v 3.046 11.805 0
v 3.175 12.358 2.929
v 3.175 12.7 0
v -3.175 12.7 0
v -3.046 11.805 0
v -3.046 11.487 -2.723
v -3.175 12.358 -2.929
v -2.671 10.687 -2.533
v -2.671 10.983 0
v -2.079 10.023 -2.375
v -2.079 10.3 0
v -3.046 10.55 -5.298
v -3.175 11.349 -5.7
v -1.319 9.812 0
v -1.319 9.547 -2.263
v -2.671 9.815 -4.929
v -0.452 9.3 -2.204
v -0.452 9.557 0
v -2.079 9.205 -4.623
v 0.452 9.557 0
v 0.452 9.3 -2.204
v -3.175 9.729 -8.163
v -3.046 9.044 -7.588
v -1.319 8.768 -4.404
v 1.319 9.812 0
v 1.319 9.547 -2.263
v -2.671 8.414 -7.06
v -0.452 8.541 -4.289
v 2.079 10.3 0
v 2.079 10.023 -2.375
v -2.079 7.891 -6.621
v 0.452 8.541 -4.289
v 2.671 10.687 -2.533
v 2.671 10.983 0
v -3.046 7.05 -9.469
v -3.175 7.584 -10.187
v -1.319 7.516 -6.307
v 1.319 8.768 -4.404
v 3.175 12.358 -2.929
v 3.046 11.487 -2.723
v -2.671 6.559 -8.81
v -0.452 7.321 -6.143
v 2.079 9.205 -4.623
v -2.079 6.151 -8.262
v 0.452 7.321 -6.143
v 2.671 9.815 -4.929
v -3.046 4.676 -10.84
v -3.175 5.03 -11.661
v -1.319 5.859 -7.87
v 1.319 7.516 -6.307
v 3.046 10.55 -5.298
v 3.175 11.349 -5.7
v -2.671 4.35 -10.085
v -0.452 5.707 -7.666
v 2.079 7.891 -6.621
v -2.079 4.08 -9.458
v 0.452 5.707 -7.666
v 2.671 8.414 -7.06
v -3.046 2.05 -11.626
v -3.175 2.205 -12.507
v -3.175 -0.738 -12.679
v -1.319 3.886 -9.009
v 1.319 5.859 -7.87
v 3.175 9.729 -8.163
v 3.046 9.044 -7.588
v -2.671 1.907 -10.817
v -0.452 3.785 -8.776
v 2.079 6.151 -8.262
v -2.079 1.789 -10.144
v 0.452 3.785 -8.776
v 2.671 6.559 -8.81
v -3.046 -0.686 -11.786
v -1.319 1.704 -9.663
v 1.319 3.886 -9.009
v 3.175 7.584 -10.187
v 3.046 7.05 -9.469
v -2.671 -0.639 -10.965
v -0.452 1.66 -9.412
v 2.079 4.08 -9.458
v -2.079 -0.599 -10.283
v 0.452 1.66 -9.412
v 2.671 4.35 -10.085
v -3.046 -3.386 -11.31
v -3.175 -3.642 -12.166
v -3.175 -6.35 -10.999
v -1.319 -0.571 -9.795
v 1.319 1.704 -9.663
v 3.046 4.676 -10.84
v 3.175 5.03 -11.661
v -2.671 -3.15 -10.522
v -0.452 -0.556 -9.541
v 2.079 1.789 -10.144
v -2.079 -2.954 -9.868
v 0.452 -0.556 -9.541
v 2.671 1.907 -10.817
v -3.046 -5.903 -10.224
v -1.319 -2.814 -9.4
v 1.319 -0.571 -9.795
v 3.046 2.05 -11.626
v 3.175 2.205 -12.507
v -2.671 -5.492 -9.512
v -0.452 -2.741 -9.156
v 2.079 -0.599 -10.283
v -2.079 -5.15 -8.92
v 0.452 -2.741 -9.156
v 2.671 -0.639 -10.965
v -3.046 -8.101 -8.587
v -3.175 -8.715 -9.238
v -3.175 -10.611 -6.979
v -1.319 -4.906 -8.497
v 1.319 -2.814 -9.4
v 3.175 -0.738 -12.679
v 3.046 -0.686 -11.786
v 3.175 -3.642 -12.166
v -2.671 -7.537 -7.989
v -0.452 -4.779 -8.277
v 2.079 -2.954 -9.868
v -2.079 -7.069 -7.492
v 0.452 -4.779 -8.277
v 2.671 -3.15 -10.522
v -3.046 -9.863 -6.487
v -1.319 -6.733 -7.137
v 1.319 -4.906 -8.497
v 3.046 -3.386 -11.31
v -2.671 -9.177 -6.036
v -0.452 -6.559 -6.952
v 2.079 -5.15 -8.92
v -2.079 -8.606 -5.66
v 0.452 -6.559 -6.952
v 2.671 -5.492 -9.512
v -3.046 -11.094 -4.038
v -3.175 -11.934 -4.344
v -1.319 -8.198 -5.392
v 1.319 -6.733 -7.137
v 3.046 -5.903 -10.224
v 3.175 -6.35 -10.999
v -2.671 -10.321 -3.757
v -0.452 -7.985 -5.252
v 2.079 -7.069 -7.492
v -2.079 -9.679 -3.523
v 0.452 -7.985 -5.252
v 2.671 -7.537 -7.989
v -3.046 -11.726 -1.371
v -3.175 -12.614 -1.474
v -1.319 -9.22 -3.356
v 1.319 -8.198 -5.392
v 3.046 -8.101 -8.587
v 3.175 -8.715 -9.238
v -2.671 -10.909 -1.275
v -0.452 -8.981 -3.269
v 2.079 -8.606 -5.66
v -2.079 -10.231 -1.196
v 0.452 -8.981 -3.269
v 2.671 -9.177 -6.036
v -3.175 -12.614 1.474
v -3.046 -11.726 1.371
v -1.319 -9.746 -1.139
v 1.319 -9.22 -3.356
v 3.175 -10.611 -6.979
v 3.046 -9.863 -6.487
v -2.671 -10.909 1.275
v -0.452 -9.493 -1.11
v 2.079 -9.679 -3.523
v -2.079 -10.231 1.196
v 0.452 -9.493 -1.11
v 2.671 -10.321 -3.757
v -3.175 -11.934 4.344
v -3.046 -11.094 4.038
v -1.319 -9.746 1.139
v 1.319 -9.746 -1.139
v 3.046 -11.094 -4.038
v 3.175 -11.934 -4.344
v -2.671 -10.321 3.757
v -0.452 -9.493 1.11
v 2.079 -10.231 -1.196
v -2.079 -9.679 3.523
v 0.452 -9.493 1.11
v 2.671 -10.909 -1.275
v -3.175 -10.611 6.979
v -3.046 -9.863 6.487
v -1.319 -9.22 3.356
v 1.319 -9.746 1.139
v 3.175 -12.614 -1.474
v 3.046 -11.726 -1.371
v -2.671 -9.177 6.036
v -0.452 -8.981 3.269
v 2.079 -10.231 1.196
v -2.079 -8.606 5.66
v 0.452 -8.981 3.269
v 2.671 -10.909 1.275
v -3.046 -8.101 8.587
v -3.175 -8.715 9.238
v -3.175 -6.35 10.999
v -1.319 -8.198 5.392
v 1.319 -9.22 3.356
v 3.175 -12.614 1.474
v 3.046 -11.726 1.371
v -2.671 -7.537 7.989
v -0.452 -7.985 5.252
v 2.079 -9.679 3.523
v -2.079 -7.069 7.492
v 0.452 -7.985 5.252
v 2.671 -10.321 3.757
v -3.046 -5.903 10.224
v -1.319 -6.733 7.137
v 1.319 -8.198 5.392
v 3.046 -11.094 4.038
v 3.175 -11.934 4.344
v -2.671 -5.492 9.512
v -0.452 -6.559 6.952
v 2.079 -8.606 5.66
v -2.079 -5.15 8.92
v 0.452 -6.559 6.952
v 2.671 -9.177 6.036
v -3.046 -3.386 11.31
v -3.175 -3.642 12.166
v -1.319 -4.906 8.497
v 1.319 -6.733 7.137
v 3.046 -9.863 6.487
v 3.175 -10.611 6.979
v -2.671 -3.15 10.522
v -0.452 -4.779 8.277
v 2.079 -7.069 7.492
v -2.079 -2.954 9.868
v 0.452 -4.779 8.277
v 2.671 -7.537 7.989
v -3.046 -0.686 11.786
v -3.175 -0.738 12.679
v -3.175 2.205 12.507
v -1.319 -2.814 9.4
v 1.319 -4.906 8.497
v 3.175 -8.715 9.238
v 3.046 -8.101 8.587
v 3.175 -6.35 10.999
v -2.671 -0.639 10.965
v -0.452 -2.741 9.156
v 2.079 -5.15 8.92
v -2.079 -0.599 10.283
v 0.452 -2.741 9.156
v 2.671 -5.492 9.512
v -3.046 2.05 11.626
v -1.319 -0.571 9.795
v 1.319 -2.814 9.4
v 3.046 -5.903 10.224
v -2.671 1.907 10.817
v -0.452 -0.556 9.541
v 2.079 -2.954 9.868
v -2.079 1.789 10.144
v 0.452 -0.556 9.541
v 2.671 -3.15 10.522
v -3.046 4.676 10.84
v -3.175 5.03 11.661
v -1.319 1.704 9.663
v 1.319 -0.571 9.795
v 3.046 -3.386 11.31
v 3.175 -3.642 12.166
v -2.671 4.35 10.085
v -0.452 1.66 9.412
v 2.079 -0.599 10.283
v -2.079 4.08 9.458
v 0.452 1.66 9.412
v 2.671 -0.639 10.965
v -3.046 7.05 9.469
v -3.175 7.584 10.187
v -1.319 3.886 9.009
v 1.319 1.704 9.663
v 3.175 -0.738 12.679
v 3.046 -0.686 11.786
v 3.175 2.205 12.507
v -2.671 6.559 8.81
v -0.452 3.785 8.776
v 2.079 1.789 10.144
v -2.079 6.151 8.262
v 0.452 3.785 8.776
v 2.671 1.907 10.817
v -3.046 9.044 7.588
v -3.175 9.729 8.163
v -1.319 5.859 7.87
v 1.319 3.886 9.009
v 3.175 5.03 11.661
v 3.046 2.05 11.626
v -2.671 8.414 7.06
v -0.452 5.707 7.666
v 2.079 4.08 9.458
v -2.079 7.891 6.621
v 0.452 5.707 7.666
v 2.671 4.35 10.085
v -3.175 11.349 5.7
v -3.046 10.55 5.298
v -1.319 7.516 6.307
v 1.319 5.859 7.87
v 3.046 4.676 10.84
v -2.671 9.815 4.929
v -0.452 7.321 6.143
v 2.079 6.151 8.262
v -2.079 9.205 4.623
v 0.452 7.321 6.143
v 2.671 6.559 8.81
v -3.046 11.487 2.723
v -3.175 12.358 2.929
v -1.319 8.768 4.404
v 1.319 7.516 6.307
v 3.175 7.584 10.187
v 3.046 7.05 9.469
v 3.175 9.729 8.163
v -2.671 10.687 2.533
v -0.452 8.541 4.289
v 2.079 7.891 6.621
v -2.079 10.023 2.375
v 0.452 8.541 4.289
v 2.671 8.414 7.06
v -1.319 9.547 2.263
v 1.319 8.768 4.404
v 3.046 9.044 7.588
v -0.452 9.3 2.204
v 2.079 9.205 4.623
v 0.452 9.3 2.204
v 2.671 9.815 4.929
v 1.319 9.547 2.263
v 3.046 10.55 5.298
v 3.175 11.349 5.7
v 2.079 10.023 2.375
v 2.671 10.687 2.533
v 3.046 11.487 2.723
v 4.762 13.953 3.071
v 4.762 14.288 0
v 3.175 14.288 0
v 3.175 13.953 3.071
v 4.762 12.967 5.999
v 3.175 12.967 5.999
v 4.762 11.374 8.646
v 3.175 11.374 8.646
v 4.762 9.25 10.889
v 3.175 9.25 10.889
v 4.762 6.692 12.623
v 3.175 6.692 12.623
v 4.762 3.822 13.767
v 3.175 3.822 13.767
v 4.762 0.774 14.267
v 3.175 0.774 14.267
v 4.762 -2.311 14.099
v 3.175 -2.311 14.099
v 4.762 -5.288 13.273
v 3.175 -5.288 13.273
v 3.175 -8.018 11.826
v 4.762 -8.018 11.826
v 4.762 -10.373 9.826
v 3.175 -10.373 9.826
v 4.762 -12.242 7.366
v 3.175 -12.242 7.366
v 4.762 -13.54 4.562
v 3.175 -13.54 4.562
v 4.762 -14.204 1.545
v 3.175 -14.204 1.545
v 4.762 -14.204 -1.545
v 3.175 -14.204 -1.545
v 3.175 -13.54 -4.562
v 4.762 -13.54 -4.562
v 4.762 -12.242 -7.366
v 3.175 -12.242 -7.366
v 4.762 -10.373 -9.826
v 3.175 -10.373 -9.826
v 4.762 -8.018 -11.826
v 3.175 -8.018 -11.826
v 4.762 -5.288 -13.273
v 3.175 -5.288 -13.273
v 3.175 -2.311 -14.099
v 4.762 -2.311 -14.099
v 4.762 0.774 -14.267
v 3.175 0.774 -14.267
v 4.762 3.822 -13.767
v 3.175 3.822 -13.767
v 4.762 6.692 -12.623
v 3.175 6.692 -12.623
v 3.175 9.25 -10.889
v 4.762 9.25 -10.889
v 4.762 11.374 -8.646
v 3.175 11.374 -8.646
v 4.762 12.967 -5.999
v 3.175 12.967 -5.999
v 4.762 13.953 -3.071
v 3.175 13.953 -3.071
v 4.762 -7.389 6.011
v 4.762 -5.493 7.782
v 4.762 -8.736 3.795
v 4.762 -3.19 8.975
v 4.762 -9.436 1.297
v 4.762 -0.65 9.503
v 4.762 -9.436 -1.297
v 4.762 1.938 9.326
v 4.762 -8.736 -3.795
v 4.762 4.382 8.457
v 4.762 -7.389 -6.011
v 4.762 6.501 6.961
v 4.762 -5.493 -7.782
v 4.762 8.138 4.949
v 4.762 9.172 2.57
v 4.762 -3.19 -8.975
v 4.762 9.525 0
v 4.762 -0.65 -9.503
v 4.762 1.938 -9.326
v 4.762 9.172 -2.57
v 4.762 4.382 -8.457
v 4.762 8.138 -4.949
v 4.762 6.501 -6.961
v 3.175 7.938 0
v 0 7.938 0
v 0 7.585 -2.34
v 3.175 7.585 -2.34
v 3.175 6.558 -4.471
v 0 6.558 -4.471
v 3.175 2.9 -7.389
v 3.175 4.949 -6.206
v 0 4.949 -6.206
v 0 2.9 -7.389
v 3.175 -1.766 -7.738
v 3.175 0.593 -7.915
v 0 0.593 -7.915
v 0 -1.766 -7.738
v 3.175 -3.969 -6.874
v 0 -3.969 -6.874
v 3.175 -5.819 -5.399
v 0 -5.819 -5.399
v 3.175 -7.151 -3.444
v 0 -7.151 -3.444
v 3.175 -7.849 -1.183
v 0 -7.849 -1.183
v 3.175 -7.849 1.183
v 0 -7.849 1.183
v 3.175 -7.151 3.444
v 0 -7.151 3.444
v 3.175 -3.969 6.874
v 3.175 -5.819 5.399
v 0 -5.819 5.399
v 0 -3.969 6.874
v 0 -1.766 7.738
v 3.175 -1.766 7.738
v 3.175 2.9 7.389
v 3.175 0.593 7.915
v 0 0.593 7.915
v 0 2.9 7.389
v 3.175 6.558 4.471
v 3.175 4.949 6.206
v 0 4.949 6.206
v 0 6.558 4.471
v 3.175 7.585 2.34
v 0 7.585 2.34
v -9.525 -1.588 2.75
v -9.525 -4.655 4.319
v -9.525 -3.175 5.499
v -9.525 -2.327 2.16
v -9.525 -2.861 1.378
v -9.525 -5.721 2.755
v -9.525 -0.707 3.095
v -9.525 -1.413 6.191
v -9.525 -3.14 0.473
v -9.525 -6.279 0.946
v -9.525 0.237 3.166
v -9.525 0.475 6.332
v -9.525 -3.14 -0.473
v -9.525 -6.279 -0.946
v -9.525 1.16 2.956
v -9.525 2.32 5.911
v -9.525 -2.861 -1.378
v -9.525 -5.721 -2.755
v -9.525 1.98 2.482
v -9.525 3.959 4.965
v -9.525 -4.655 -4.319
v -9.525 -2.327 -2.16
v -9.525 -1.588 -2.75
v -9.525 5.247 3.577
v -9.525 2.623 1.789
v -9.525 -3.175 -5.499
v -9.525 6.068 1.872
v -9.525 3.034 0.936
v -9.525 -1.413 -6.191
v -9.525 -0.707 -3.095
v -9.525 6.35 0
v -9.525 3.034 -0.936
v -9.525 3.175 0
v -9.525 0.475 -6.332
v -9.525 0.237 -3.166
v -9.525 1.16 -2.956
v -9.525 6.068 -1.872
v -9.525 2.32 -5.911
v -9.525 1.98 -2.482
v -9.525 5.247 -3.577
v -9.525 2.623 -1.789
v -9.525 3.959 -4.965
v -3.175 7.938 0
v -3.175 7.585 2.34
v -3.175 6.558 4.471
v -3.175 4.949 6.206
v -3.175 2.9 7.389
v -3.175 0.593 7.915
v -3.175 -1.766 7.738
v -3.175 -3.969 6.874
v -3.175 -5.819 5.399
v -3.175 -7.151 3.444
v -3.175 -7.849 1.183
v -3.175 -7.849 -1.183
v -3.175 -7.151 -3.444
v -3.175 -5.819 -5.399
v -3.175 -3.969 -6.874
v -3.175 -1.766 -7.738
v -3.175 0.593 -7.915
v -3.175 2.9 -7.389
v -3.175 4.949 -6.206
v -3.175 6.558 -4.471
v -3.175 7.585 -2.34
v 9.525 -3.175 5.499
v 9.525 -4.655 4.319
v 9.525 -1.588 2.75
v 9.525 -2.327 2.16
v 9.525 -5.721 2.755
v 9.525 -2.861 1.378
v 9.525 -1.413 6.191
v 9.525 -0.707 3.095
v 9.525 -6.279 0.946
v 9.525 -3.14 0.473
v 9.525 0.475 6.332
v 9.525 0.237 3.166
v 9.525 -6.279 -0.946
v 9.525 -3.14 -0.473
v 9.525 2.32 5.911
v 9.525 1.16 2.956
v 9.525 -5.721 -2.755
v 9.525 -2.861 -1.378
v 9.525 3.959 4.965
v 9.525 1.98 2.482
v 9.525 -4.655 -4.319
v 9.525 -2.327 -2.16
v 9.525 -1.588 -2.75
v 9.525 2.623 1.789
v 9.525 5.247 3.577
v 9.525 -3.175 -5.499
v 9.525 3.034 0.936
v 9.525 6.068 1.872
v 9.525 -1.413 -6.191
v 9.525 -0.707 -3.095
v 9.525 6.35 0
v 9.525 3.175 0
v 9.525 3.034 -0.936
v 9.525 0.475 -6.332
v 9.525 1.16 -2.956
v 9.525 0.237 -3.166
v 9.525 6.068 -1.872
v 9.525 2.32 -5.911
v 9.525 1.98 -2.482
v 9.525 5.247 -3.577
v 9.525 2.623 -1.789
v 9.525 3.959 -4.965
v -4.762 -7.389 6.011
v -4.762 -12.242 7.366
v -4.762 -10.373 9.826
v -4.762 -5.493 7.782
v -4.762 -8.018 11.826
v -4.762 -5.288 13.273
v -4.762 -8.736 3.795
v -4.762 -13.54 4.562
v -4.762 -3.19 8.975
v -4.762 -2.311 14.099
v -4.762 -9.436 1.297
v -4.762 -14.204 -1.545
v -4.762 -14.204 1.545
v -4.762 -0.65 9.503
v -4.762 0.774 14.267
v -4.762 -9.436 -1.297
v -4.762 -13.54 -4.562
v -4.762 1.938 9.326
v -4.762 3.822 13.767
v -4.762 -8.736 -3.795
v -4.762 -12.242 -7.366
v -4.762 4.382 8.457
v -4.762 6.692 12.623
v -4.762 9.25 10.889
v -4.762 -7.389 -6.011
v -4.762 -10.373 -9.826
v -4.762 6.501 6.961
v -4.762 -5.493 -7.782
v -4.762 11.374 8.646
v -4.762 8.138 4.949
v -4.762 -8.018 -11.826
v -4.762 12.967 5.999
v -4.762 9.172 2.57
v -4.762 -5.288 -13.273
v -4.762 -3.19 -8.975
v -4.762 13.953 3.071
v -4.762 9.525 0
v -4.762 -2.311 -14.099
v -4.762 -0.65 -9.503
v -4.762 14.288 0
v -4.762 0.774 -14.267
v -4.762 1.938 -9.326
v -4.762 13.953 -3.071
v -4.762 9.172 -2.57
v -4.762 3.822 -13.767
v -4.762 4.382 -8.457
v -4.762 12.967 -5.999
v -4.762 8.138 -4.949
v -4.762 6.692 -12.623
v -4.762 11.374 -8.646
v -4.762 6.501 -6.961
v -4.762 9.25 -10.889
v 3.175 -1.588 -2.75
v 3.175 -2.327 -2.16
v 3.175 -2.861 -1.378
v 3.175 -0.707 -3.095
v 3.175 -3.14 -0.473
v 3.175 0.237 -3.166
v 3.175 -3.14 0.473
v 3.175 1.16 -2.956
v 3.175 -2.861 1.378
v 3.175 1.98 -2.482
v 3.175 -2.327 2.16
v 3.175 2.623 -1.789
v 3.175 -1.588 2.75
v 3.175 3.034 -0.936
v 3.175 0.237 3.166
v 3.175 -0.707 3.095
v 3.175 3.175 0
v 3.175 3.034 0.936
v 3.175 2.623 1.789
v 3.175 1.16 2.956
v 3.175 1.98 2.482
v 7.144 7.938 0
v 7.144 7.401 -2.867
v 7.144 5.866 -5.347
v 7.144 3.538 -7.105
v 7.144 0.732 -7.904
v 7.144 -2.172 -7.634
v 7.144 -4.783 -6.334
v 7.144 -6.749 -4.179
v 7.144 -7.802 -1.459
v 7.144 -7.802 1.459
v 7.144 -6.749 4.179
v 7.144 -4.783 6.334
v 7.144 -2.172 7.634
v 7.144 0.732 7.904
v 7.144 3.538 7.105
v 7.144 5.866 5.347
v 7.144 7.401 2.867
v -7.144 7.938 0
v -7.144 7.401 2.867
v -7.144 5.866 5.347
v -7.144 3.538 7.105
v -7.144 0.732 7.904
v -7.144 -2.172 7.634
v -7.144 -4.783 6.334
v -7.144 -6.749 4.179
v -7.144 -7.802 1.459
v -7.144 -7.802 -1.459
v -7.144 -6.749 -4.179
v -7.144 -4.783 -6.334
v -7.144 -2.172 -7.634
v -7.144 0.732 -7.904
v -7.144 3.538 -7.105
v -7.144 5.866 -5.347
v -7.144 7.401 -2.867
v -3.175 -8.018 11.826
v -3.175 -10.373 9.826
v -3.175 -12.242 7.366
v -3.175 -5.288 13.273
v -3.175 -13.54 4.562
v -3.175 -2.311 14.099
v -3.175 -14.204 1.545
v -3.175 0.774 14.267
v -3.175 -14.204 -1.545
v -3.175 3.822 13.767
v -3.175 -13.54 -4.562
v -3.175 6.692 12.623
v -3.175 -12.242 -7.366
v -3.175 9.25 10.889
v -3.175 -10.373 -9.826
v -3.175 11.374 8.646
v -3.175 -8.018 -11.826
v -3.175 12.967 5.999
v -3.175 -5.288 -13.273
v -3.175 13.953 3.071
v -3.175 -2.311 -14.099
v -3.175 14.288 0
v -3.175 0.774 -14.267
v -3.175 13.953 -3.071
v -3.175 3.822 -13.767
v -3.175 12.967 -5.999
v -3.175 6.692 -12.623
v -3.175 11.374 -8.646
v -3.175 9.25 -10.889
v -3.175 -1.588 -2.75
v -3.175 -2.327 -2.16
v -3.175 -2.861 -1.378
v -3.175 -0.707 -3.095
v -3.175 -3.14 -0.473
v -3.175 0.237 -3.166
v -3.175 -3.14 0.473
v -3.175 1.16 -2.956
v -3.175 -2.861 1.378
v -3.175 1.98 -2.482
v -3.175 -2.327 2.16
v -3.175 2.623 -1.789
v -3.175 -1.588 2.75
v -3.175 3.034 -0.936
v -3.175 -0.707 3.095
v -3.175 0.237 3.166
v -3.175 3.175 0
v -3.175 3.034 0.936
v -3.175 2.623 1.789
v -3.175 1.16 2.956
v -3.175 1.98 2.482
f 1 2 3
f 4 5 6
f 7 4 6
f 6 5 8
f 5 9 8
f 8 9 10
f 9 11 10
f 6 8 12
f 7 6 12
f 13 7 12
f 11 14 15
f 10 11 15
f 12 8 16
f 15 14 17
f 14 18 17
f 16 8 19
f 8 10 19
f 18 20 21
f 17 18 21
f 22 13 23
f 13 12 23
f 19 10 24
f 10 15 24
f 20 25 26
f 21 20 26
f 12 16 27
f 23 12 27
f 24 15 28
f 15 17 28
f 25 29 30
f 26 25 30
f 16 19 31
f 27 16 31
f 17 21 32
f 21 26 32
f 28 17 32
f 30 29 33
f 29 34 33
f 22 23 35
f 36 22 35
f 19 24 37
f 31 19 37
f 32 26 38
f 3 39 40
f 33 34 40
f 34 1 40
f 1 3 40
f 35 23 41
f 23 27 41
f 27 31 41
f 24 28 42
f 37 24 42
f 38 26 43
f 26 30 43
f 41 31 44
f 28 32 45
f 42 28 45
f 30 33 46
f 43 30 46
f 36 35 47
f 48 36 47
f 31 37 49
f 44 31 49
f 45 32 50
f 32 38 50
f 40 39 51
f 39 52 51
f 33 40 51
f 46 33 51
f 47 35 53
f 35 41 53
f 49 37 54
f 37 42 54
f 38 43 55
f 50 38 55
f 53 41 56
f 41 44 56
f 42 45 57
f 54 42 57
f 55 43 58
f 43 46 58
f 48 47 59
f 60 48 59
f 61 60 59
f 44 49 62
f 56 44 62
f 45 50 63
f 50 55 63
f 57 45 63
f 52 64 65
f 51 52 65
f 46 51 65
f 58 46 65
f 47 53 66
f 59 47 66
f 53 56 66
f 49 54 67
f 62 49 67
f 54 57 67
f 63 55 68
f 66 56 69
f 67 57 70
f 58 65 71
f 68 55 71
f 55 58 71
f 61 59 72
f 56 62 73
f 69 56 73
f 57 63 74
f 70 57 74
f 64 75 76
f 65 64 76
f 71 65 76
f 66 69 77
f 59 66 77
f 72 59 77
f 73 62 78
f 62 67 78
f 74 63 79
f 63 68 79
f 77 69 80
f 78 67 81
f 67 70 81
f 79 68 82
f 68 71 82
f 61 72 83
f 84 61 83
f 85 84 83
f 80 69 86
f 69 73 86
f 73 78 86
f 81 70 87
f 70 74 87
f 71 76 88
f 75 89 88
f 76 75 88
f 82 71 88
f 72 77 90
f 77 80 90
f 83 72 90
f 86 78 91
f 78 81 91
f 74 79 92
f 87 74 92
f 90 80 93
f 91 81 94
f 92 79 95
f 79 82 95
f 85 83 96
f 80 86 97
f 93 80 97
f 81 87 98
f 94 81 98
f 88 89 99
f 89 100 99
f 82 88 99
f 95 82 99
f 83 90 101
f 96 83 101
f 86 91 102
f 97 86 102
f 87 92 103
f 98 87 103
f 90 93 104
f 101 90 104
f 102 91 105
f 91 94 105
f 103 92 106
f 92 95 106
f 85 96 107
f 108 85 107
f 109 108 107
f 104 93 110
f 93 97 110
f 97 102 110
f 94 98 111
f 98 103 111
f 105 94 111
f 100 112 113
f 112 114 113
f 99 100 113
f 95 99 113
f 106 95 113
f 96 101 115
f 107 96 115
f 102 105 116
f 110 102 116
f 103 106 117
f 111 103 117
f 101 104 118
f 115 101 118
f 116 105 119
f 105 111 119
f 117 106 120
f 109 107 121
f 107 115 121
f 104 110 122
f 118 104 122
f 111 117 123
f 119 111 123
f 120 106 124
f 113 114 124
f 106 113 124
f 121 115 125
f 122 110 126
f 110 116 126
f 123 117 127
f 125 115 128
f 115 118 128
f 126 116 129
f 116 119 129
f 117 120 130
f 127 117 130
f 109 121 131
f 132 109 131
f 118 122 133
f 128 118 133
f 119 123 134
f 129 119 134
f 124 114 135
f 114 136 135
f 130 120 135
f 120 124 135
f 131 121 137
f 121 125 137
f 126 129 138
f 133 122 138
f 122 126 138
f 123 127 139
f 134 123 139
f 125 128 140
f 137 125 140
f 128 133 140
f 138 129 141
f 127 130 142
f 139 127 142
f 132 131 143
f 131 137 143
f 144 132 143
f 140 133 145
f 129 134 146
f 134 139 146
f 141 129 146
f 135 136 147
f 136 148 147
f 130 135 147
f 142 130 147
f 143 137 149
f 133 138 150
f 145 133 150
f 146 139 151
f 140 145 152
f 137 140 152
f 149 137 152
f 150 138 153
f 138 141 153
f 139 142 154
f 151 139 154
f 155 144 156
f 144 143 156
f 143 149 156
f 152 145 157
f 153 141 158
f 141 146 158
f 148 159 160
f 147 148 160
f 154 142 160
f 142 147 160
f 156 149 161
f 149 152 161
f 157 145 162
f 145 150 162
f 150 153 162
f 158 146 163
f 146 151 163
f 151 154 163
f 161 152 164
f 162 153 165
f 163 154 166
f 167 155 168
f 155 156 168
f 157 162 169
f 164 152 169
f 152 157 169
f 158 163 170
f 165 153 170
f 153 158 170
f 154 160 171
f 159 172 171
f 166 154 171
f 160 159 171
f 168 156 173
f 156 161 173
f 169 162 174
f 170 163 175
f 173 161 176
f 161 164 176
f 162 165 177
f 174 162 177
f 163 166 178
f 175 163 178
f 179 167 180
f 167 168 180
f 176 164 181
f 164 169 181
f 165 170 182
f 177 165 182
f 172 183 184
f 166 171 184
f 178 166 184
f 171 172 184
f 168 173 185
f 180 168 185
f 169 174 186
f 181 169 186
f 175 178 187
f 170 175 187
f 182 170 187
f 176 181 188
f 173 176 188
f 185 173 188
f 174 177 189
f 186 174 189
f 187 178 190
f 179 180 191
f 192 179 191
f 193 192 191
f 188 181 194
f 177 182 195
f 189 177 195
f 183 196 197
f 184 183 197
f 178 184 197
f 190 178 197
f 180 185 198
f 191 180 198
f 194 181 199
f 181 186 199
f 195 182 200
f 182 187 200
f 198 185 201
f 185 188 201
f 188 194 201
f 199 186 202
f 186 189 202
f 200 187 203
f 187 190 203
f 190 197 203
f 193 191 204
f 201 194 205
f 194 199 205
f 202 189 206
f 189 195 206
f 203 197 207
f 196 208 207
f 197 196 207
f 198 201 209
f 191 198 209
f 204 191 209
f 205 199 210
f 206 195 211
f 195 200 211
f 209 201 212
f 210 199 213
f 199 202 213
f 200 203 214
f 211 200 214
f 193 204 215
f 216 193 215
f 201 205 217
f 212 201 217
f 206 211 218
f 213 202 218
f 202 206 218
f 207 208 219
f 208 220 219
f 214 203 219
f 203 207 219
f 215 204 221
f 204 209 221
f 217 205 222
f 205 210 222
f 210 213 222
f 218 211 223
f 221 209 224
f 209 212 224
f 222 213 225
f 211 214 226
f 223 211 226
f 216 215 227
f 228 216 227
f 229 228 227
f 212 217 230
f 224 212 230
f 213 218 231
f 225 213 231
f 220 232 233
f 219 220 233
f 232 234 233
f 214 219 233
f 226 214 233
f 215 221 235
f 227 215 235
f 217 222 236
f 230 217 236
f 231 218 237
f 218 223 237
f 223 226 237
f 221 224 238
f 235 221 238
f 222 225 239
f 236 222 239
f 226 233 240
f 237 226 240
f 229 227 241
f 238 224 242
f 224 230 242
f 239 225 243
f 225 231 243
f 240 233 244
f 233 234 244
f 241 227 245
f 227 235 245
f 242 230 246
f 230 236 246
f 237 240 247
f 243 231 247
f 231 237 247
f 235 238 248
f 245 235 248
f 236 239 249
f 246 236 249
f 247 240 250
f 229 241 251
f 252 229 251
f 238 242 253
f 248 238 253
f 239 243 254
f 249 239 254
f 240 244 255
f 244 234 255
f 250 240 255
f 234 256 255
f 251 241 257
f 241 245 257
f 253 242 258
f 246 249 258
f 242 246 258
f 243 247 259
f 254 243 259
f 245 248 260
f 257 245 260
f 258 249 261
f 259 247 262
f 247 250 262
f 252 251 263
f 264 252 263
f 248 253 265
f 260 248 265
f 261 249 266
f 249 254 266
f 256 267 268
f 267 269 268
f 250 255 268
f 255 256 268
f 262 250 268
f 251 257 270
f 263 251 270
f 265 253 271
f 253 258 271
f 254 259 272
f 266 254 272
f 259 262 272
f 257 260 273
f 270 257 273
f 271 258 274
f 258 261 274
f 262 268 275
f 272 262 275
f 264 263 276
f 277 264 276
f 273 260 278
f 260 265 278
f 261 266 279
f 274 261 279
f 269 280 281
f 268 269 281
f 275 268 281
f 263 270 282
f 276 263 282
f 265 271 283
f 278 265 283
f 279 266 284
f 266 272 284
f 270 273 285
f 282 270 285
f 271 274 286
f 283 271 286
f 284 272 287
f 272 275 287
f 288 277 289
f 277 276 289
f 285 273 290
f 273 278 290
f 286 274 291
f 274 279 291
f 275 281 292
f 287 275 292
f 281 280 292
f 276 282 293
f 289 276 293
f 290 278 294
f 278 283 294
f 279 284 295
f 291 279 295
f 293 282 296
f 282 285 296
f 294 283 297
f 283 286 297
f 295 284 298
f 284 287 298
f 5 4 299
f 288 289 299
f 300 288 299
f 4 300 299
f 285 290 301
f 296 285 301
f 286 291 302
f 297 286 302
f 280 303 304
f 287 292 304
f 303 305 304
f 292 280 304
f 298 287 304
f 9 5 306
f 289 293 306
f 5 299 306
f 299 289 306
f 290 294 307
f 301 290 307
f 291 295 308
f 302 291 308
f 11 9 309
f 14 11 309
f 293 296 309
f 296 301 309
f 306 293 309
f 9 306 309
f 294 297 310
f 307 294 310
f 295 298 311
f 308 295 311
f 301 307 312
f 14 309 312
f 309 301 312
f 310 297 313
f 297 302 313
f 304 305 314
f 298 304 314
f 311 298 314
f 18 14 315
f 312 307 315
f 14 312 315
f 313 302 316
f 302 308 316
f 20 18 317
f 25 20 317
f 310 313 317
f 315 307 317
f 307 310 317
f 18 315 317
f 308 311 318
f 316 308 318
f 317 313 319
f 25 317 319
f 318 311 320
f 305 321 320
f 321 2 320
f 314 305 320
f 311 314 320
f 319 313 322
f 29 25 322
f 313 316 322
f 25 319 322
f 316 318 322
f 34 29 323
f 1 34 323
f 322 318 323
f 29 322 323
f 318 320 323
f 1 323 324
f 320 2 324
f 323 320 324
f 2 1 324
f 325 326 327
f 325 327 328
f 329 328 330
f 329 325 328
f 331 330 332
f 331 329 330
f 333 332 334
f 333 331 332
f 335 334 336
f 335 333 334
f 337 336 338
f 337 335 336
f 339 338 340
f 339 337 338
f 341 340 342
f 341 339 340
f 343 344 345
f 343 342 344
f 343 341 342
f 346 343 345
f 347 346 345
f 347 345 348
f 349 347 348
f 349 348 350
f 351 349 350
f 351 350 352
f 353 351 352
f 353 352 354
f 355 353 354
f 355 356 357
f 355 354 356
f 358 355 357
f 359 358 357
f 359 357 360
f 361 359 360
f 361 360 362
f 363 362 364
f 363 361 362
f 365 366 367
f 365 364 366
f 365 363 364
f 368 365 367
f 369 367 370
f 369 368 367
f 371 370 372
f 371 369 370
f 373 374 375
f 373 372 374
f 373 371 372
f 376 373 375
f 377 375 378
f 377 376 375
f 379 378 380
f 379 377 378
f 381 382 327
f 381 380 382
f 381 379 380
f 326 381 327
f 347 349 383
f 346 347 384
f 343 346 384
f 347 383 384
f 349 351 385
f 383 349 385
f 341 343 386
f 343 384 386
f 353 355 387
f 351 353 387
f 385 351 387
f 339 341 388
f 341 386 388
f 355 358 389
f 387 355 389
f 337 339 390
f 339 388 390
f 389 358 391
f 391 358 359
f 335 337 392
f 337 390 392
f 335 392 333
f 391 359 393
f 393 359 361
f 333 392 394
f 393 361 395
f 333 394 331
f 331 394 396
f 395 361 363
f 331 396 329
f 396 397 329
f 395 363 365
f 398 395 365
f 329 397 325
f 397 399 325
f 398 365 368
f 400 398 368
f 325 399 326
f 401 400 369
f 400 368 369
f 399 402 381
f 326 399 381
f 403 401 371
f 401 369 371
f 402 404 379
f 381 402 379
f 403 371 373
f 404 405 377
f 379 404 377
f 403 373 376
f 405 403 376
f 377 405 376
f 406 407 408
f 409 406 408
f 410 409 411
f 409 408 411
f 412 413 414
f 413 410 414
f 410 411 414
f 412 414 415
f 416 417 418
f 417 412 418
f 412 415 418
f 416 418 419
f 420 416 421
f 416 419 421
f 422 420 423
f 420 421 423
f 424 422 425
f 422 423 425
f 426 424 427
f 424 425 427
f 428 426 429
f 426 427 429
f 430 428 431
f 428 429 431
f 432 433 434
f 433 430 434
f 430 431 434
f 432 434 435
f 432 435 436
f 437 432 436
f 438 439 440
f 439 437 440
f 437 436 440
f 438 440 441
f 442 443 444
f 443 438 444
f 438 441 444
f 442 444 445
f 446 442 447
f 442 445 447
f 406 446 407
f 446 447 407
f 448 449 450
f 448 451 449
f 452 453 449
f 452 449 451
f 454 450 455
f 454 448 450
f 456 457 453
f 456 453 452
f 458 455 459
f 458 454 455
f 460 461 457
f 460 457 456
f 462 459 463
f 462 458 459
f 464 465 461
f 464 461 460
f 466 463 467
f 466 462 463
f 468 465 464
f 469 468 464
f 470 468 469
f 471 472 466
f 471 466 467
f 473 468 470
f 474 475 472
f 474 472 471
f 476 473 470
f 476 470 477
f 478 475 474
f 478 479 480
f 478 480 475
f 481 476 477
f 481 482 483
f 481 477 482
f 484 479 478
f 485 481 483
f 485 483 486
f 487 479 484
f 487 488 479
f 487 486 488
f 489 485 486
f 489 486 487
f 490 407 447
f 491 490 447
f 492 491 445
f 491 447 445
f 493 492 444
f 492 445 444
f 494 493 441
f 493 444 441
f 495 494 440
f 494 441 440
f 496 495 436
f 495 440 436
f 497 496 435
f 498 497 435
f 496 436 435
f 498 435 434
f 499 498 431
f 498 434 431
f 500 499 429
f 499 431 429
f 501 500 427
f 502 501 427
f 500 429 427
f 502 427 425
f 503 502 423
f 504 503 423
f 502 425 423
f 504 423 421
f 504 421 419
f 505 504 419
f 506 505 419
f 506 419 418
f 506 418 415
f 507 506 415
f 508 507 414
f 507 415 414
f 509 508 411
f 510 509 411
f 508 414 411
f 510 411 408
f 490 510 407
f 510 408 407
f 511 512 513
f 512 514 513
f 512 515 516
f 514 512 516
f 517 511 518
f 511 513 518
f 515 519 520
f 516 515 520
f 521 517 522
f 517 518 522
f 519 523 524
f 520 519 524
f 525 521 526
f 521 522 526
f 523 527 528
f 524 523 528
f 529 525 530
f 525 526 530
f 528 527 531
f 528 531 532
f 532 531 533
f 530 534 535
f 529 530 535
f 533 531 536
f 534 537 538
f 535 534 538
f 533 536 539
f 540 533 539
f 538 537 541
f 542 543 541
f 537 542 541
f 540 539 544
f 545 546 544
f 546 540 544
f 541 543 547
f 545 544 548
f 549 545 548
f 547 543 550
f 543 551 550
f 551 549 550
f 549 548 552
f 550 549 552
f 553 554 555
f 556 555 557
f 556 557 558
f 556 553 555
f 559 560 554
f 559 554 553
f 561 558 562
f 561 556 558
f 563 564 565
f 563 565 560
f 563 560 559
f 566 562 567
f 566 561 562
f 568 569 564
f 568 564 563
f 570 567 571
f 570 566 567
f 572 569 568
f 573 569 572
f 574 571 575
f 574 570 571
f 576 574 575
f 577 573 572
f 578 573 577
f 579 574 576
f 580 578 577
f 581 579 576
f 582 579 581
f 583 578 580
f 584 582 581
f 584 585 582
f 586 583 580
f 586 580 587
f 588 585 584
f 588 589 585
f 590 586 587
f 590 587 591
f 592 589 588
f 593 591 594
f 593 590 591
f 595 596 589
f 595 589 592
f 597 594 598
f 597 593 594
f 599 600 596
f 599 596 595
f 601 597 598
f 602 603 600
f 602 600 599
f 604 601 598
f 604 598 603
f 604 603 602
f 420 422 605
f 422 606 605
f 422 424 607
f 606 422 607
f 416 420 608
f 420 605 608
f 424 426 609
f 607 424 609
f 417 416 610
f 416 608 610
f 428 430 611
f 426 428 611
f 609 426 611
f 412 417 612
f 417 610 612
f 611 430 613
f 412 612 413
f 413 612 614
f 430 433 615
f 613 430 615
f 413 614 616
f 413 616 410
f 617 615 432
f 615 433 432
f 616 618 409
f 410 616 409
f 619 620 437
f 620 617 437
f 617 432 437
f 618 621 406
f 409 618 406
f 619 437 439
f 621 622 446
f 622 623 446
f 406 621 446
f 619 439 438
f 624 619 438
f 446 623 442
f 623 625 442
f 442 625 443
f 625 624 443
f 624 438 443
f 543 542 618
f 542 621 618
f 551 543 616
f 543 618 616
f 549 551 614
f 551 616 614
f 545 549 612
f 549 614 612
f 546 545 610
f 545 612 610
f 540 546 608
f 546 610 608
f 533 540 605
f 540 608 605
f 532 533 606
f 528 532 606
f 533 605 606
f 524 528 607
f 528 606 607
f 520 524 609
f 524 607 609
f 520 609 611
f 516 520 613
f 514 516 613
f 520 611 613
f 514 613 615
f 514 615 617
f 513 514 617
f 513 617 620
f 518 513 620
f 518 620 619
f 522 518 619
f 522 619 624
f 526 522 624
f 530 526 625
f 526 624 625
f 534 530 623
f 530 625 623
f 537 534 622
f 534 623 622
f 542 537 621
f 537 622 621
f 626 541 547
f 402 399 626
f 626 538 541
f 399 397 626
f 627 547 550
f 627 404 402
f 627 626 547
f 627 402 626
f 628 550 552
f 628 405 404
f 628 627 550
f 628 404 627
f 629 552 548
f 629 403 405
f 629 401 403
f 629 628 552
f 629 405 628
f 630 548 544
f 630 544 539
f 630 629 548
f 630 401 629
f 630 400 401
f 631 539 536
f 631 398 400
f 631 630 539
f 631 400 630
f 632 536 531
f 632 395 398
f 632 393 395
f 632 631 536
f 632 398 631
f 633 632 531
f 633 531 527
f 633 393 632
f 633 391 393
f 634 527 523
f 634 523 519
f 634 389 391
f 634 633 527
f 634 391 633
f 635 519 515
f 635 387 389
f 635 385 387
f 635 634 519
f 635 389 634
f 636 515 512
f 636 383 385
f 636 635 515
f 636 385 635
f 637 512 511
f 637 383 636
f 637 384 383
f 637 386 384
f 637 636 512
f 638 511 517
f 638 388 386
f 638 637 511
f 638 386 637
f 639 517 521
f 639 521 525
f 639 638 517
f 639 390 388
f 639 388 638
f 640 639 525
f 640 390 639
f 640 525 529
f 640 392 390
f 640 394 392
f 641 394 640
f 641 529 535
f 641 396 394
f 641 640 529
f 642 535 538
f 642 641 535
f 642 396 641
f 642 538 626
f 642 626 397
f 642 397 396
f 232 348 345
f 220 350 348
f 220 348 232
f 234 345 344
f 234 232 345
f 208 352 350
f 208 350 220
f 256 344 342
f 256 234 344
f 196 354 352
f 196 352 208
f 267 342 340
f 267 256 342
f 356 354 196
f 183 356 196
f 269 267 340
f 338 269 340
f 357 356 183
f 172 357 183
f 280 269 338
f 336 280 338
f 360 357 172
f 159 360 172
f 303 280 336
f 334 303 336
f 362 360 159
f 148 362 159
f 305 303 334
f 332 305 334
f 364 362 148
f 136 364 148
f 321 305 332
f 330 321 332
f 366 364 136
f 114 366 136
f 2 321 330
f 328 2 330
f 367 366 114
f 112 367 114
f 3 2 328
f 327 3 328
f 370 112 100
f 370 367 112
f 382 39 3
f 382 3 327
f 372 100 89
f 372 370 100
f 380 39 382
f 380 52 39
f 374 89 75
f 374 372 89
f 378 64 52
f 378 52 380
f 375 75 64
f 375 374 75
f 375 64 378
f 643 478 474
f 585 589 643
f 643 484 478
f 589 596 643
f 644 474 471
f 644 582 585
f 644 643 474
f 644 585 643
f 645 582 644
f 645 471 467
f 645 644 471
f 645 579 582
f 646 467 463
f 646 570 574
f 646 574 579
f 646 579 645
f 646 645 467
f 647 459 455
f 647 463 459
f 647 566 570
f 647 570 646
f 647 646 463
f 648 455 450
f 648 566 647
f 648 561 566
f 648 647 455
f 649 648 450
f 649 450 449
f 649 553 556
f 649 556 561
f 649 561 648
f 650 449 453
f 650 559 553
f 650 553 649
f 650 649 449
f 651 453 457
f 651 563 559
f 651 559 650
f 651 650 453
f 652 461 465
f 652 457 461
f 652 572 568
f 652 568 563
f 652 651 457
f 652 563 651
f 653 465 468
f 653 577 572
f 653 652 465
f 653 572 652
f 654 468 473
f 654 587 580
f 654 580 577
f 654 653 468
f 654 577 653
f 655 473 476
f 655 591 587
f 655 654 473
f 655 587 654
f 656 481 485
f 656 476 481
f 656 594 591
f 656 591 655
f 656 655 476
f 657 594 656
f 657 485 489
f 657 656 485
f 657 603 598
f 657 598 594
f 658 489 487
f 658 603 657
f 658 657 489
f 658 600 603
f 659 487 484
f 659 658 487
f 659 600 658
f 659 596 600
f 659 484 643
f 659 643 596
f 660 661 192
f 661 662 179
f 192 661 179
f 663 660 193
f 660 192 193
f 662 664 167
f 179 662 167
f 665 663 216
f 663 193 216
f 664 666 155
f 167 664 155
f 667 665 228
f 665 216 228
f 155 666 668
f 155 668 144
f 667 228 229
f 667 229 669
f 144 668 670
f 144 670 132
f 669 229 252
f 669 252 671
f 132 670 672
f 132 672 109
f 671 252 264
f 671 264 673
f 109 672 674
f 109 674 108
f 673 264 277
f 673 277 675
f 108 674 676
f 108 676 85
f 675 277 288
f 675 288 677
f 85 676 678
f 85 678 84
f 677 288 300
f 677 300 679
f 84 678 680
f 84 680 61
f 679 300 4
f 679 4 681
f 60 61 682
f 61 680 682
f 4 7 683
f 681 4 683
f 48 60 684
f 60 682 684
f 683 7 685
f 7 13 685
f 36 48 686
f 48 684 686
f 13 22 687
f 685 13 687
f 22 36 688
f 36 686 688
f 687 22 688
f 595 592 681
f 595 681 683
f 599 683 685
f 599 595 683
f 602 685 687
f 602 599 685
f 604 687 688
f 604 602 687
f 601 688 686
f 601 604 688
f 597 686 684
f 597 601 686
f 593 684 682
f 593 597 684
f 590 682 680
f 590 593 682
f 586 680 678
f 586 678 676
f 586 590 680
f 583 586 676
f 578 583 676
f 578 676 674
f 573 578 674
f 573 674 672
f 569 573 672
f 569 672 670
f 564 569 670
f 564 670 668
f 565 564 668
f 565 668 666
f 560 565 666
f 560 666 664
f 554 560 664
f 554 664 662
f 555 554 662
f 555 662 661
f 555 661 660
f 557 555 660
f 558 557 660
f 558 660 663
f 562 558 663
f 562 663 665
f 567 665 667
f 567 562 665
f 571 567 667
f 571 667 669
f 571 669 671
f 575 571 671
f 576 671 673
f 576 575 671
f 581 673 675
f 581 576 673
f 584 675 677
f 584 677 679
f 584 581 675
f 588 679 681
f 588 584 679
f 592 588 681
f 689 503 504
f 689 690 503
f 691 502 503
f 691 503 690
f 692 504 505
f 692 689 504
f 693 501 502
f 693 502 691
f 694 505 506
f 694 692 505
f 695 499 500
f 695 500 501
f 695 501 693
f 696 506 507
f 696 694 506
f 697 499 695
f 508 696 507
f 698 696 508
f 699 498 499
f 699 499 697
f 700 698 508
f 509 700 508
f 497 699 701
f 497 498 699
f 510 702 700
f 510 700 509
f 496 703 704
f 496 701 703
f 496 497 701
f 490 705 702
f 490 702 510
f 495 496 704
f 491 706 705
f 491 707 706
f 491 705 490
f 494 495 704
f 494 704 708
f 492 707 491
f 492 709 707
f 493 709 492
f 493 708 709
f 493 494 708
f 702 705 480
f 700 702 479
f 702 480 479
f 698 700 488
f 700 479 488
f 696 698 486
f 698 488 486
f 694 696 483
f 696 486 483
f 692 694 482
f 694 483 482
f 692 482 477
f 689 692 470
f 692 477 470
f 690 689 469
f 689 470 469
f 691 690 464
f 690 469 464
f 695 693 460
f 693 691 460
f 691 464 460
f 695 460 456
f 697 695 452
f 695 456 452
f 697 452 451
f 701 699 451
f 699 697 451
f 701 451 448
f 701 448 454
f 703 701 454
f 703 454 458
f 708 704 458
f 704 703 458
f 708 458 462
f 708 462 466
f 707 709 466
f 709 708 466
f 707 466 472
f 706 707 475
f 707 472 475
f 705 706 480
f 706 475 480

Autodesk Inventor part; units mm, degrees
ref_plane "YZ Plane" through (0, 0, 0) normal (1, 0, 0) x (0, 1, 0)
ref_plane "XZ Plane" through (0, 0, 0) normal (0, 1, 0) x (-1, 0, 0)
ref_plane "XY Plane" through (0, 0, 0) normal (0, 0, 1) x (1, 0, 0)
sketch "Sketch1" plane through (0, 0, 0) normal (0, 0, 1) x (1, 0, 0)
  arc A0 (-3.175, 12.7) -> (3.175, 12.7) centre (0, 12.7) ccw
  line L0 (0, -1.6305) -> (0, 0) construction
  line L1 (0, -1.6305) -> (0, 9.525) construction
  line L2 (3.175, 12.7) -> (3.175, 14.2875)
  line L3 (3.175, 14.2875) -> (4.7625, 14.2875)
  line L4 (4.7625, 14.2875) -> (4.7625, 9.525)
  line L5 (-3.175, 12.7) -> (-3.175, 14.2875)
  line L6 (-3.175, 14.2875) -> (-4.7625, 14.2875)
  line L7 (-4.7625, 14.2875) -> (-4.7625, 9.525)
  line L8 (9.525, 3.175) -> (-9.525, 3.175)
  line L9 (3.175, 12.7) -> (-3.175, 12.7) construction
  line L10 (9.525, 6.35) -> (9.525, 3.175)
  line L11 (-9.525, 6.35) -> (-9.525, 3.175)
  line L12 (9.525, 6.35) -> (4.7625, 9.525)
  line L13 (-4.7625, 9.525) -> (-9.525, 6.35)
  line L14 (21.4144, 0) -> (-14.6121, 0) construction
  point P0 (0, 3.175)
  dimension "d1" = 1.5875
  dimension "d2" = 1.5875
  dimension "d7" = 9.525
  dimension "d8" = 3.175
  dimension "d10" = 3.175
  dimension "d11" = 9.525
  dimension "d12" = 19.05
  dimension "d13" = 3.175
  dimension "d14" = 3.175
revolve "Revolution1" add sketch "Sketch1" angle 360 about axis through (21.4144, 0, 0) along (-1, 0, 0)
sketch "Sketch2" plane through (0, 0, 0) normal (1, 0, 0) x (0, 1, 0)
  circle A0 centre (0, 0) radius 3.175 projected
  circle A1 centre (0, 0) radius 7.9375
  point P0 (0, 0)
  dimension "d16" = 15.875
extrude "Extrusion1" cut sketch "Sketch2" along normal mid plane 6.35
properties part number "line pulley" material "ABS Plastic"
